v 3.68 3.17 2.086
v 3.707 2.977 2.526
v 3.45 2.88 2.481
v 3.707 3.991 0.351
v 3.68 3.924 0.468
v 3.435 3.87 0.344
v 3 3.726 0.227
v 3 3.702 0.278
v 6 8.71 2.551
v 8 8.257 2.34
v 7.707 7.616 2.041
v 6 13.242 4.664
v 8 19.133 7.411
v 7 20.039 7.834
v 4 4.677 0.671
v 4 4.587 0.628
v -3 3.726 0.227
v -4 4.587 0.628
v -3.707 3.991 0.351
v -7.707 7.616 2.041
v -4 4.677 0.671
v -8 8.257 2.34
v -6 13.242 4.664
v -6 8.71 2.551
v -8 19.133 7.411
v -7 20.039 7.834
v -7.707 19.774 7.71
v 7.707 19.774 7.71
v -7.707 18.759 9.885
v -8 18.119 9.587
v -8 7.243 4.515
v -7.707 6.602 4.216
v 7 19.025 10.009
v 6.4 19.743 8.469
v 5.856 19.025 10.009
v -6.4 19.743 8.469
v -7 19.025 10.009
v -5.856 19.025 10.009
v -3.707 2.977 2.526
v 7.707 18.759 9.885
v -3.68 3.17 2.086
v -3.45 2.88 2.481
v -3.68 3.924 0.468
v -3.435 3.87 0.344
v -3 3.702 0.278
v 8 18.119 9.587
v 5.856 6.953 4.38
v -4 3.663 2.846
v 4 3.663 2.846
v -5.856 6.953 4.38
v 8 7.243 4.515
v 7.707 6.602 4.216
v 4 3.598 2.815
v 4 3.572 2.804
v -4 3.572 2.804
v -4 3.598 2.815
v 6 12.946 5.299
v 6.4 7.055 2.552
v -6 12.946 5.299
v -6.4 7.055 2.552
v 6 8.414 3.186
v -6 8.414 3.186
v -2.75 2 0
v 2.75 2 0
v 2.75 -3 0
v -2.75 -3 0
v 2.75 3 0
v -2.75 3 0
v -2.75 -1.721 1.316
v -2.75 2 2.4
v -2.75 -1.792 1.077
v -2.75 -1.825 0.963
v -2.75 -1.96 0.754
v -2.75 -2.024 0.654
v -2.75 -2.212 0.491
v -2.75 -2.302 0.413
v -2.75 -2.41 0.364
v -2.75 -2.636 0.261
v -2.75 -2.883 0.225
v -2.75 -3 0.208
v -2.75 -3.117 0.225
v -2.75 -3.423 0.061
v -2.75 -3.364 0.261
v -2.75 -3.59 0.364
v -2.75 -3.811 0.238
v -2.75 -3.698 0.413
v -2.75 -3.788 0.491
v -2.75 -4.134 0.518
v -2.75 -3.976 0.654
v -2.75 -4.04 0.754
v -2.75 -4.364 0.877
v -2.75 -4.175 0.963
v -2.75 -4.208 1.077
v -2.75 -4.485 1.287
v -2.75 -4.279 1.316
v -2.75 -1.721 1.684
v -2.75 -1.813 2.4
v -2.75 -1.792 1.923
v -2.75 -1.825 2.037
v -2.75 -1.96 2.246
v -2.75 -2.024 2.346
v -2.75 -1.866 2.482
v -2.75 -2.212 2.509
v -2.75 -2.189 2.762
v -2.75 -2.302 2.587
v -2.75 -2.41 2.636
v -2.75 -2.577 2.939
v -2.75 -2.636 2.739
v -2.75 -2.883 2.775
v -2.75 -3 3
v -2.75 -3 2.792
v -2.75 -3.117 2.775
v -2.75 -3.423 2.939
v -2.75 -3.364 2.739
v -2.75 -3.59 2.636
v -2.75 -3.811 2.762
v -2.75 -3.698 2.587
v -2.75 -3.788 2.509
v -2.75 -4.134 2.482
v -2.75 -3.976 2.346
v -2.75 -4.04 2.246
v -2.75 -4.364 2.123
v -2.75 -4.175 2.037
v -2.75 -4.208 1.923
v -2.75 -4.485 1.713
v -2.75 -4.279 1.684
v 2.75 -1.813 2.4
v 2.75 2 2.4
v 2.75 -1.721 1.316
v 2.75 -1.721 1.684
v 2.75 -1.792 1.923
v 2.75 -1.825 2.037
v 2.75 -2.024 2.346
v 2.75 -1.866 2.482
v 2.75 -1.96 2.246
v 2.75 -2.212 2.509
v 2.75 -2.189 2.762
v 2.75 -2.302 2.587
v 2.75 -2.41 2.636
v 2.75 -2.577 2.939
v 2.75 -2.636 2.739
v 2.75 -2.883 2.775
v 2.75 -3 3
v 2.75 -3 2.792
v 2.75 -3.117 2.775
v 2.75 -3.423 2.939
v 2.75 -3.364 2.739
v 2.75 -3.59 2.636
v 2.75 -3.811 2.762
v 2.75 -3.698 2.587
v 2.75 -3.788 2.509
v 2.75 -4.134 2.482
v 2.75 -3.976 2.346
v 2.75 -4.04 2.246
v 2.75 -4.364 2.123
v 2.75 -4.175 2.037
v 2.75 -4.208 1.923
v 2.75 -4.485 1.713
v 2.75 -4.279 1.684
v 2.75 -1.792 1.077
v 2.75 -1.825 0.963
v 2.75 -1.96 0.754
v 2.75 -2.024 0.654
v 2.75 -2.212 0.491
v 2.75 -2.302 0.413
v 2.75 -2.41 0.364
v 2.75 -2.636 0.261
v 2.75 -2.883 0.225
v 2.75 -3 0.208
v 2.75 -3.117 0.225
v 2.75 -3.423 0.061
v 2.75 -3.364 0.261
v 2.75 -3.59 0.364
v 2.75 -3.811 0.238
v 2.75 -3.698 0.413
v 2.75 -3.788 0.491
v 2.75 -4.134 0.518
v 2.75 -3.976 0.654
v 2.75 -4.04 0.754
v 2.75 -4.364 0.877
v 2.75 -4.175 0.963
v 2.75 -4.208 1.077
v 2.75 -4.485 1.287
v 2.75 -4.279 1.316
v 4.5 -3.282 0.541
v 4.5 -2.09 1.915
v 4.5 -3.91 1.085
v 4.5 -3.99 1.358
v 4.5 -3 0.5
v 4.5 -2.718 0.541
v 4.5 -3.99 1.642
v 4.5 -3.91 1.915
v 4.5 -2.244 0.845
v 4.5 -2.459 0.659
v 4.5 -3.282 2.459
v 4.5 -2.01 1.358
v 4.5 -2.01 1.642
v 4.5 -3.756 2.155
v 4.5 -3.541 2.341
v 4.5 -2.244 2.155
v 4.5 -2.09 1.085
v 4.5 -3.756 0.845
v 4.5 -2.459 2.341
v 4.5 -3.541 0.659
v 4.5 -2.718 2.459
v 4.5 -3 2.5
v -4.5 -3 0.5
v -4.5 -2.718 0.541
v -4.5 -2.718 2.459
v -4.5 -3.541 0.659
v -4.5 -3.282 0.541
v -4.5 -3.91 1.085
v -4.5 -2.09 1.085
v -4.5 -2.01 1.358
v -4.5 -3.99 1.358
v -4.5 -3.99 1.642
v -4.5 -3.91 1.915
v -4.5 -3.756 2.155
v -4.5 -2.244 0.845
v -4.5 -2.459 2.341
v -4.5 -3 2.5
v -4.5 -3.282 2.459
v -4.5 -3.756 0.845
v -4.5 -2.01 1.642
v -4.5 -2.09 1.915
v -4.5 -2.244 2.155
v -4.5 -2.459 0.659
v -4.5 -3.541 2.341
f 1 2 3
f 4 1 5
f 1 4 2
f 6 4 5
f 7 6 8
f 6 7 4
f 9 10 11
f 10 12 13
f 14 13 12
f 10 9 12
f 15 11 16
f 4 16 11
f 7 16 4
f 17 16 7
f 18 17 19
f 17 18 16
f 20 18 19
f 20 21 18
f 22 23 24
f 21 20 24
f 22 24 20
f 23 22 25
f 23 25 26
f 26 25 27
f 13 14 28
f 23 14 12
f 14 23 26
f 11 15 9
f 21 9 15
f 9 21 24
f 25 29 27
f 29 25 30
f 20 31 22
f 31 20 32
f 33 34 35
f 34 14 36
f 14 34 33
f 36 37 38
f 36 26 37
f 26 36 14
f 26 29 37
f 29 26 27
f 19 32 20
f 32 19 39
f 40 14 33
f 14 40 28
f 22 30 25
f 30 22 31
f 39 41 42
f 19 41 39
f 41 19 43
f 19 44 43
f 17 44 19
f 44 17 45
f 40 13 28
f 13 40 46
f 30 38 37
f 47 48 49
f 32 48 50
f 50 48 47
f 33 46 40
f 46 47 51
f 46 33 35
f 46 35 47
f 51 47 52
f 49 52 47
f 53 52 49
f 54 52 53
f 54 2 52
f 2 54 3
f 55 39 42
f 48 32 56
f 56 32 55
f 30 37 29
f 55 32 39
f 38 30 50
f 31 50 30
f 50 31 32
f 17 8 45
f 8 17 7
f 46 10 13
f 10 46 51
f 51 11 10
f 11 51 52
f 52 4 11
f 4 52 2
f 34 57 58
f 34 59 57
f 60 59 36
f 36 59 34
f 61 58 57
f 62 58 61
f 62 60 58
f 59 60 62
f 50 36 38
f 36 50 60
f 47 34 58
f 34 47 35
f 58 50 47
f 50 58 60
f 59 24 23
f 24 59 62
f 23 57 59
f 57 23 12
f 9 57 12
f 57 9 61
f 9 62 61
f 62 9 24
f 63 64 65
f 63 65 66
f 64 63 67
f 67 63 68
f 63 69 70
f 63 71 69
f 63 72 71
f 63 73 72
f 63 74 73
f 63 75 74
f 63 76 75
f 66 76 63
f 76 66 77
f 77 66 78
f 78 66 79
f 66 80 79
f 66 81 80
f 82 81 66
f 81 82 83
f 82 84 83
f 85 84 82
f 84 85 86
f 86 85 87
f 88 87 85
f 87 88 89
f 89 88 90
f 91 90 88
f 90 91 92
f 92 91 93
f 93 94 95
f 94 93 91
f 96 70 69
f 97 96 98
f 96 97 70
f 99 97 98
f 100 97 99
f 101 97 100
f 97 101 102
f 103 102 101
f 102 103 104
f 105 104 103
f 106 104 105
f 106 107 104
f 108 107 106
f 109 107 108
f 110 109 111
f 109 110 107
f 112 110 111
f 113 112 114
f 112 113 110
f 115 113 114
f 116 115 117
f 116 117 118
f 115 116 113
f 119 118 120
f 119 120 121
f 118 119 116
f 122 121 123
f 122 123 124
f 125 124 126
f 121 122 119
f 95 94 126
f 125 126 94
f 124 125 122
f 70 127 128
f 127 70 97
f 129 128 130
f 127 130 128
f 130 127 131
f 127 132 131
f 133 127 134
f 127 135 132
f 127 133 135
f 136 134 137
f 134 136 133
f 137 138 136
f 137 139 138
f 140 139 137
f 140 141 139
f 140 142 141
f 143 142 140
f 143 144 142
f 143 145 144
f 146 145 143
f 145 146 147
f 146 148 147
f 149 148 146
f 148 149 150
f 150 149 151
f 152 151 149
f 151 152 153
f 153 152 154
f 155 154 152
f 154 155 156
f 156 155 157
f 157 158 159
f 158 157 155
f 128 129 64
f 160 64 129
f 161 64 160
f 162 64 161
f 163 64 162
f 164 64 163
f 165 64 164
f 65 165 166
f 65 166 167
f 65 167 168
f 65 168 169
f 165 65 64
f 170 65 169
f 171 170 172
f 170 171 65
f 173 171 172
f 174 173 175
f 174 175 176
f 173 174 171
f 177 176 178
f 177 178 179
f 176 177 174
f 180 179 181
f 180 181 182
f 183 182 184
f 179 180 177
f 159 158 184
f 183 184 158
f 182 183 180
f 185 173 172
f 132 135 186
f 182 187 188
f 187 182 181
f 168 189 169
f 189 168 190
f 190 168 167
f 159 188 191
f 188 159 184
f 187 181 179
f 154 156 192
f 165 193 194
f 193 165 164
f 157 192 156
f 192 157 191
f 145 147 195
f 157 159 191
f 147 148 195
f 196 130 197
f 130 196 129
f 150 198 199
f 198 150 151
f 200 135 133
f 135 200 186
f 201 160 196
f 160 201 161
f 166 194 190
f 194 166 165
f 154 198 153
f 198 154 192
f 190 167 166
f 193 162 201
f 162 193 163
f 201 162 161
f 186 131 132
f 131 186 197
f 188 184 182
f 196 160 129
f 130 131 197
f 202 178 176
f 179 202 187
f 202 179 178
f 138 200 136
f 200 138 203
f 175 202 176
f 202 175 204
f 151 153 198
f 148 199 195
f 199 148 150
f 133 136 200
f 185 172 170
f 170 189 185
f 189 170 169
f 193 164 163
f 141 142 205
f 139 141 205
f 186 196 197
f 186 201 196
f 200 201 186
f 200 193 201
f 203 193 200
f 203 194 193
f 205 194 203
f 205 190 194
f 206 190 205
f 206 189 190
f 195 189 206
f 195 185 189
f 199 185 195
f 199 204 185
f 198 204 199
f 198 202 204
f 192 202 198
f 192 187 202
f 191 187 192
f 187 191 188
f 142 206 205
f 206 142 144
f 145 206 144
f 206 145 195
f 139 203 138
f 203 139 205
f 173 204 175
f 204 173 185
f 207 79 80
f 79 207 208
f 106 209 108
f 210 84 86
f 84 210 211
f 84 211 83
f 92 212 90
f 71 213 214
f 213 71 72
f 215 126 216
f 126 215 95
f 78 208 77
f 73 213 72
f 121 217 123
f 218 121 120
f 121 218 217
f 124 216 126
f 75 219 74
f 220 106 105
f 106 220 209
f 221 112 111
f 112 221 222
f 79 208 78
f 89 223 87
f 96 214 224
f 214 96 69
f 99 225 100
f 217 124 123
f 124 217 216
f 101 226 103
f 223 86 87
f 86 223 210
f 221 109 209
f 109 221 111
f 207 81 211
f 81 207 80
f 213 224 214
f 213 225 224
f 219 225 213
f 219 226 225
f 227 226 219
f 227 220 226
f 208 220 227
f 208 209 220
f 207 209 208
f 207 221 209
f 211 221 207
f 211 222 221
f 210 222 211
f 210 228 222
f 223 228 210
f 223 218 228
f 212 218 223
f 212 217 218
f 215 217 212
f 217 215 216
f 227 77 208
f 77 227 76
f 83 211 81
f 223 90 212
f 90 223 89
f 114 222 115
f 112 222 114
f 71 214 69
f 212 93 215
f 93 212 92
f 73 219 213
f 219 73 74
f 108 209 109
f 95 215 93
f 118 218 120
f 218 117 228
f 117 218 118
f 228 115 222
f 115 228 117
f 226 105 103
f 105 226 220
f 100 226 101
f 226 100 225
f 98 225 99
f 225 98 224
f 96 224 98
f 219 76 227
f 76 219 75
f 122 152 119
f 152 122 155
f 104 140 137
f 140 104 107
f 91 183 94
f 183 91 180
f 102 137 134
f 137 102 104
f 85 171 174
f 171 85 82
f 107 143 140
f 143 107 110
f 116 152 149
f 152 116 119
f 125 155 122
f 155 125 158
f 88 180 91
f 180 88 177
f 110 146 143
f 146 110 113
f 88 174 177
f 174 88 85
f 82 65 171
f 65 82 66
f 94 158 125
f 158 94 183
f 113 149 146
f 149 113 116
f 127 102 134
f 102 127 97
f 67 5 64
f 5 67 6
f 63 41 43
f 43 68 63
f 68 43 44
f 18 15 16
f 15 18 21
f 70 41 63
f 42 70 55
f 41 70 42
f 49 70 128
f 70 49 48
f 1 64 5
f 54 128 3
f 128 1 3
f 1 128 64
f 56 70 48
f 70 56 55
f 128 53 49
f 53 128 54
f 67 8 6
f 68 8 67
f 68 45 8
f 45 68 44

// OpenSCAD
// BB-6g hinge parts for the led tape
           
pt1=[ [0,4], [4,0], [10,0], [14,4], [14,16], [0,16] ];
            
            // Led tape tab
            translate([0,13,4]) color("red"){
                rotate([25,0,0]){
                difference(){
                    translate([-7,-9,0.5])
                    linear_extrude(height=2.4) 
                        offset(r=1,$fn=8)
                        polygon(points=pt1);
                    
                    // main slot for tape
                    translate([0,2,1.2])
                    linear_extrude(height=2,scale=0.9)
                    square(size=[12.8,16],center=true);

                    // cut for wires
                    translate([0,-2,-1])
                    linear_extrude(height=3,scale=1)
                    
                    square(size=[12,5],center=true);
                }
            }
            }
            
            // Hinge parts
            linear_extrude(height=2.4,scale=1)
            square(size=[5.5,6],center=true);
        
            translate([3,-3,1.5]) rotate([0,90,0])
            cylinder(r1=1.5,r2=1.0,h=3,center=true,$fn=22);

            translate([-3,-3,1.5]) rotate([0,90,0])
            cylinder(r1=1.0,r2=1.5,h=3,center=true,$fn=22);

            translate([0,-3,1.5]) rotate([0,90,0])
            cylinder(r=1.5,h=5.5,center=true,$fn=22);


            hull(){
            // landing on hinge 
            translate([0,2.5,0]) color("cyan")
            linear_extrude(height=2.4,scale=1)
            square(size=[5.5,1],center=true);
            // landing on tab
            translate([0,13,4]) color("pink"){
                rotate([25,0,0]){
                    translate([0,-9,0.5])
                    linear_extrude(height=2.4,scale=1)
                    square(size=[8,0.1],center=true);
                }
            }
            
        }
